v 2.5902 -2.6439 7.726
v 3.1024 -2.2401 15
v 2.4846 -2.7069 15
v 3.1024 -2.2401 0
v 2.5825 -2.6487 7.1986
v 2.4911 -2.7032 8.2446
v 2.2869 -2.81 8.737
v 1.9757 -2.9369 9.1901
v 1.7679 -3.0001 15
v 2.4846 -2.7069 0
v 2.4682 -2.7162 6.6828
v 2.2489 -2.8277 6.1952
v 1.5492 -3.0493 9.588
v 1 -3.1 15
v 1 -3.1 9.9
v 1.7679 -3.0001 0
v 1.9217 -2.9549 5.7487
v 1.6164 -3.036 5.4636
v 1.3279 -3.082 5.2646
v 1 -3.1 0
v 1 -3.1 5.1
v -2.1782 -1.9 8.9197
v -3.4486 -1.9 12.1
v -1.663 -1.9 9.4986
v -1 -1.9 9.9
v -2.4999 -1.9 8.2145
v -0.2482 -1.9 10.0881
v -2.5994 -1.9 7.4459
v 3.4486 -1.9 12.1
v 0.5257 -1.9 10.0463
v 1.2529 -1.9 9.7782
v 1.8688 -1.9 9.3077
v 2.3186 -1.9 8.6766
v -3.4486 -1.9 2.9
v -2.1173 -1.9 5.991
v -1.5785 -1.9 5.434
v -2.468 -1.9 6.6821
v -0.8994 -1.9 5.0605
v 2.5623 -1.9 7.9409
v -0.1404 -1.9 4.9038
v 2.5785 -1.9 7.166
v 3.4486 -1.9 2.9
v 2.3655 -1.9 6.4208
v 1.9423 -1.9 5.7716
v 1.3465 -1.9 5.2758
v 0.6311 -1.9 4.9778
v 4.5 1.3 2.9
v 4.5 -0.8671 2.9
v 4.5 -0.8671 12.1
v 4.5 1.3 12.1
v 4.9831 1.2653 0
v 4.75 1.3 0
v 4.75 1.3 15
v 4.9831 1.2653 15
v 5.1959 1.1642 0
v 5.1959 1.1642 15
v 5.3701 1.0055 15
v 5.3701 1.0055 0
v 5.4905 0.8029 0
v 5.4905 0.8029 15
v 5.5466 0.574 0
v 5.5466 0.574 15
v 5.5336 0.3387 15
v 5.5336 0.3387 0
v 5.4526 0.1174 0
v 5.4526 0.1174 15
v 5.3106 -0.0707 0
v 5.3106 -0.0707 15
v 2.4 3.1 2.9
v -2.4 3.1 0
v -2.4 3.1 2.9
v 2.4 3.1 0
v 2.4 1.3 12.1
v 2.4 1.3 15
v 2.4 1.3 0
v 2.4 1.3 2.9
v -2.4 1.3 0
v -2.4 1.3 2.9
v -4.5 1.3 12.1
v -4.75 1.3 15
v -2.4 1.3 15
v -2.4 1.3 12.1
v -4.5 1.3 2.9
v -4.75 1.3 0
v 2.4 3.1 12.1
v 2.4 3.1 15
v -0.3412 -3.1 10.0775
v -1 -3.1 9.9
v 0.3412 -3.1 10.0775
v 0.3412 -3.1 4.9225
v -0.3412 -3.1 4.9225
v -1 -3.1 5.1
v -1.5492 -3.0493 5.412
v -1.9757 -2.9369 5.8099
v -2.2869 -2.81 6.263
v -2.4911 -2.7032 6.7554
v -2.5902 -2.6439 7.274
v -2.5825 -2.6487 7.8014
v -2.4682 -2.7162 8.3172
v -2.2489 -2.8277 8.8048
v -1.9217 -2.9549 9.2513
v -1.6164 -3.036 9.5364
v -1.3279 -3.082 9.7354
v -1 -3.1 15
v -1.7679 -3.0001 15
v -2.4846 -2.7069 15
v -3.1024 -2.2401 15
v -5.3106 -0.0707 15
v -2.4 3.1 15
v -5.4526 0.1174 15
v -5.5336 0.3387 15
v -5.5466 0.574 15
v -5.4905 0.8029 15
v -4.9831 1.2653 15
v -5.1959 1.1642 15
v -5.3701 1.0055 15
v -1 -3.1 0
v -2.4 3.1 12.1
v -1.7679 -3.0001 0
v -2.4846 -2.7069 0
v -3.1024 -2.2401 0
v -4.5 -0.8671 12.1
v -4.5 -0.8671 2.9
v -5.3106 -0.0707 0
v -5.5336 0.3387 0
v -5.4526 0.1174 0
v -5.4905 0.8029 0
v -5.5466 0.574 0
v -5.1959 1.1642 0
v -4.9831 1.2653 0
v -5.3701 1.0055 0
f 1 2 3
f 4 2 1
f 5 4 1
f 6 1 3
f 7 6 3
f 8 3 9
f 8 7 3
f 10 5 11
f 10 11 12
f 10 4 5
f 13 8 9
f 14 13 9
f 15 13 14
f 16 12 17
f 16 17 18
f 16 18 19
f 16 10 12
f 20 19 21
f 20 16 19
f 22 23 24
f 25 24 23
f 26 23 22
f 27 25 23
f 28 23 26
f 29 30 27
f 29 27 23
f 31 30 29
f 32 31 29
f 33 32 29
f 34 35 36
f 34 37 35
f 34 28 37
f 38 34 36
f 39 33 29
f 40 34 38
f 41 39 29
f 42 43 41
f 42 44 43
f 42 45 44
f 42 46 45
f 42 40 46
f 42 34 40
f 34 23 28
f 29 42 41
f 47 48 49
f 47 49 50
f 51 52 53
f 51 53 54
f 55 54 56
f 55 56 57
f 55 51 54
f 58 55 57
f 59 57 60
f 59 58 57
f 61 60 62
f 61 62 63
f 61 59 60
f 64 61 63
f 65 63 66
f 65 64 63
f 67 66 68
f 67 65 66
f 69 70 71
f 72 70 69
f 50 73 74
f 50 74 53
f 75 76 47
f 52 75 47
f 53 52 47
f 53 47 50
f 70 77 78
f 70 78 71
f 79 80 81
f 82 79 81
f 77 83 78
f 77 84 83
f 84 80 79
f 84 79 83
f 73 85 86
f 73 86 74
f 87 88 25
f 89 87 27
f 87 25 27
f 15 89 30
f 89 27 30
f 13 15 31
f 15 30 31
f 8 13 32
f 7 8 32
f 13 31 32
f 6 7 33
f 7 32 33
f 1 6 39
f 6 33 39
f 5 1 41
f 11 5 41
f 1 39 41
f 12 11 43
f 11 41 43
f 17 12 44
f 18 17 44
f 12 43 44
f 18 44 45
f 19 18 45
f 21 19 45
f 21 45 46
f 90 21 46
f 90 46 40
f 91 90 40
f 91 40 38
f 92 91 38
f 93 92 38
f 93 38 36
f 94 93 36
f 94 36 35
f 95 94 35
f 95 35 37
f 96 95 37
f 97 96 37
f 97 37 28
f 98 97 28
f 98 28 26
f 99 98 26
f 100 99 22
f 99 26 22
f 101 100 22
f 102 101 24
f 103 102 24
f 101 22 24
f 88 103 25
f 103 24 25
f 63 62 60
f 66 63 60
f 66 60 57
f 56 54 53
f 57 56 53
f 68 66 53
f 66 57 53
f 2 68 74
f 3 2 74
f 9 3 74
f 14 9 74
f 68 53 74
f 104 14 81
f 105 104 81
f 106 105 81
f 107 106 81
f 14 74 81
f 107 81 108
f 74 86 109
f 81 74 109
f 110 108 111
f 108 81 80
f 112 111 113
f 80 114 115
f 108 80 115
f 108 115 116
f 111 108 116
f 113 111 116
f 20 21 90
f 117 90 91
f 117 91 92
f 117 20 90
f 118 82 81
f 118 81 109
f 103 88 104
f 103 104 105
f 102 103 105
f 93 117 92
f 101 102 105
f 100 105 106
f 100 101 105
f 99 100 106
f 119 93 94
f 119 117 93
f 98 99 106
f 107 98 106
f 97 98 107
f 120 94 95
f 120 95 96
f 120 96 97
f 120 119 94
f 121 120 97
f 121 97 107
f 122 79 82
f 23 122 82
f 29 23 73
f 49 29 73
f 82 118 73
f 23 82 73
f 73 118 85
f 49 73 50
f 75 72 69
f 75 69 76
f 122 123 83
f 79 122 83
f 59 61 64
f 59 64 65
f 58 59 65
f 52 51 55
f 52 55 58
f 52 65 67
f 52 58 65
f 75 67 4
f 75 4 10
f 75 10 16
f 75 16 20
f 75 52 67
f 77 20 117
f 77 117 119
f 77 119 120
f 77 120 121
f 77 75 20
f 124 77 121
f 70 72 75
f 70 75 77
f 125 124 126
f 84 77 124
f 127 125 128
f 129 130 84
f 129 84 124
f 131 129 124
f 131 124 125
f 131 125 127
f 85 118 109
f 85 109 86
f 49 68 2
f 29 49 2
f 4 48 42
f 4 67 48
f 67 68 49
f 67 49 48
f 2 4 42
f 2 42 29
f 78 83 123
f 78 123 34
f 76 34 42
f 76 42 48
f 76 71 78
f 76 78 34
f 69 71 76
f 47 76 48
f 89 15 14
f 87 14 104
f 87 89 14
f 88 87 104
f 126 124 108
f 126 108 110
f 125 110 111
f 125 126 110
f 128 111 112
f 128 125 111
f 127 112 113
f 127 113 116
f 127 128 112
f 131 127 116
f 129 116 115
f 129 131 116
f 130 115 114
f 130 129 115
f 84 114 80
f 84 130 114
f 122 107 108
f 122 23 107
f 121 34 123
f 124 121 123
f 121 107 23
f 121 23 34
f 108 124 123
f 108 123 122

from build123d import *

# Parameters (mm, degrees)
BOSS_EXTRUDE1_DEPTH     = 15
SKETCH2_R               = 2.6
CUT_EXTRUDE1_DEPTH      = 18.153498186
CUT_EXTRUDE2_DEPTH      = 4.6
CUT_EXTRUDE2_DEPTH_BACK = 4.6
SKETCH6_W               = 9
SKETCH6_H               = 3.2
SKETCH7_W               = 9
SKETCH7_H               = 9.2
CUT_EXTRUDE3_DEPTH      = 17.588022904


with BuildPart() as part:
    # Sketch1 → Boss-Extrude1 (new body)
    with BuildSketch(Plane.XY):
        with BuildLine():
            Line((-4.75, 1.3), (-2.4, 1.3))
            Line((-2.4, 1.3), (-2.4, 3.1))
            Line((-2.4, 3.1), (2.4, 3.1))
            Line((2.4, 3.1), (2.4, 1.3))
            Line((2.4, 1.3), (4.75, 1.3))
            ThreePointArc((4.75, 1.3), (5.490454883, 0.802863939), (5.310642707, -0.070683586))
            Line((5.310642707, -0.070683586), (3.102410151, -2.240063447))
            ThreePointArc((3.102410151, -2.240063447), (2.135739772, -2.876705813), (1, -3.1))
            Line((1, -3.1), (-1, -3.1))
            ThreePointArc((-1, -3.1), (-2.135739772, -2.876705813), (-3.102410151, -2.240063447))
            Line((-3.102410151, -2.240063447), (-5.310642707, -0.070683586))
            ThreePointArc((-5.310642707, -0.070683586), (-5.490454883, 0.802863939), (-4.75, 1.3))
        make_face()
    extrude(amount=BOSS_EXTRUDE1_DEPTH)

    # Sketch2 → Cut-Extrude1 (cut, through all)
    with BuildSketch(Plane(origin=(0, 3.1, 0), x_dir=(1, 0, 0), z_dir=(0, 1, 0))):
        with Locations(Location((0, -7.5, 0), (0, 0, 247.380135052))):
            Circle(SKETCH2_R)
    extrude(amount=-CUT_EXTRUDE1_DEPTH, mode=Mode.SUBTRACT)

    # Sketch6 → Cut-Extrude2 (cut, two sides: drawn at the far end of the back side and taken through both)
    with BuildSketch(Plane.XY.offset(7.5).offset(-CUT_EXTRUDE2_DEPTH_BACK)):
        with Locations((0, -0.3)):
            Rectangle(SKETCH6_W, SKETCH6_H)
    extrude(amount=CUT_EXTRUDE2_DEPTH + CUT_EXTRUDE2_DEPTH_BACK, mode=Mode.SUBTRACT)

    # Sketch7 → Cut-Extrude3 (cut, through all)
    with BuildSketch(Plane(origin=(0, 1.3, 0), x_dir=(1, 0, 0), z_dir=(0, 1, 0))):
        with Locations((0, -7.5)):
            Rectangle(SKETCH7_W, SKETCH7_H)
    extrude(amount=CUT_EXTRUDE3_DEPTH, mode=Mode.SUBTRACT)


solid = part.part
